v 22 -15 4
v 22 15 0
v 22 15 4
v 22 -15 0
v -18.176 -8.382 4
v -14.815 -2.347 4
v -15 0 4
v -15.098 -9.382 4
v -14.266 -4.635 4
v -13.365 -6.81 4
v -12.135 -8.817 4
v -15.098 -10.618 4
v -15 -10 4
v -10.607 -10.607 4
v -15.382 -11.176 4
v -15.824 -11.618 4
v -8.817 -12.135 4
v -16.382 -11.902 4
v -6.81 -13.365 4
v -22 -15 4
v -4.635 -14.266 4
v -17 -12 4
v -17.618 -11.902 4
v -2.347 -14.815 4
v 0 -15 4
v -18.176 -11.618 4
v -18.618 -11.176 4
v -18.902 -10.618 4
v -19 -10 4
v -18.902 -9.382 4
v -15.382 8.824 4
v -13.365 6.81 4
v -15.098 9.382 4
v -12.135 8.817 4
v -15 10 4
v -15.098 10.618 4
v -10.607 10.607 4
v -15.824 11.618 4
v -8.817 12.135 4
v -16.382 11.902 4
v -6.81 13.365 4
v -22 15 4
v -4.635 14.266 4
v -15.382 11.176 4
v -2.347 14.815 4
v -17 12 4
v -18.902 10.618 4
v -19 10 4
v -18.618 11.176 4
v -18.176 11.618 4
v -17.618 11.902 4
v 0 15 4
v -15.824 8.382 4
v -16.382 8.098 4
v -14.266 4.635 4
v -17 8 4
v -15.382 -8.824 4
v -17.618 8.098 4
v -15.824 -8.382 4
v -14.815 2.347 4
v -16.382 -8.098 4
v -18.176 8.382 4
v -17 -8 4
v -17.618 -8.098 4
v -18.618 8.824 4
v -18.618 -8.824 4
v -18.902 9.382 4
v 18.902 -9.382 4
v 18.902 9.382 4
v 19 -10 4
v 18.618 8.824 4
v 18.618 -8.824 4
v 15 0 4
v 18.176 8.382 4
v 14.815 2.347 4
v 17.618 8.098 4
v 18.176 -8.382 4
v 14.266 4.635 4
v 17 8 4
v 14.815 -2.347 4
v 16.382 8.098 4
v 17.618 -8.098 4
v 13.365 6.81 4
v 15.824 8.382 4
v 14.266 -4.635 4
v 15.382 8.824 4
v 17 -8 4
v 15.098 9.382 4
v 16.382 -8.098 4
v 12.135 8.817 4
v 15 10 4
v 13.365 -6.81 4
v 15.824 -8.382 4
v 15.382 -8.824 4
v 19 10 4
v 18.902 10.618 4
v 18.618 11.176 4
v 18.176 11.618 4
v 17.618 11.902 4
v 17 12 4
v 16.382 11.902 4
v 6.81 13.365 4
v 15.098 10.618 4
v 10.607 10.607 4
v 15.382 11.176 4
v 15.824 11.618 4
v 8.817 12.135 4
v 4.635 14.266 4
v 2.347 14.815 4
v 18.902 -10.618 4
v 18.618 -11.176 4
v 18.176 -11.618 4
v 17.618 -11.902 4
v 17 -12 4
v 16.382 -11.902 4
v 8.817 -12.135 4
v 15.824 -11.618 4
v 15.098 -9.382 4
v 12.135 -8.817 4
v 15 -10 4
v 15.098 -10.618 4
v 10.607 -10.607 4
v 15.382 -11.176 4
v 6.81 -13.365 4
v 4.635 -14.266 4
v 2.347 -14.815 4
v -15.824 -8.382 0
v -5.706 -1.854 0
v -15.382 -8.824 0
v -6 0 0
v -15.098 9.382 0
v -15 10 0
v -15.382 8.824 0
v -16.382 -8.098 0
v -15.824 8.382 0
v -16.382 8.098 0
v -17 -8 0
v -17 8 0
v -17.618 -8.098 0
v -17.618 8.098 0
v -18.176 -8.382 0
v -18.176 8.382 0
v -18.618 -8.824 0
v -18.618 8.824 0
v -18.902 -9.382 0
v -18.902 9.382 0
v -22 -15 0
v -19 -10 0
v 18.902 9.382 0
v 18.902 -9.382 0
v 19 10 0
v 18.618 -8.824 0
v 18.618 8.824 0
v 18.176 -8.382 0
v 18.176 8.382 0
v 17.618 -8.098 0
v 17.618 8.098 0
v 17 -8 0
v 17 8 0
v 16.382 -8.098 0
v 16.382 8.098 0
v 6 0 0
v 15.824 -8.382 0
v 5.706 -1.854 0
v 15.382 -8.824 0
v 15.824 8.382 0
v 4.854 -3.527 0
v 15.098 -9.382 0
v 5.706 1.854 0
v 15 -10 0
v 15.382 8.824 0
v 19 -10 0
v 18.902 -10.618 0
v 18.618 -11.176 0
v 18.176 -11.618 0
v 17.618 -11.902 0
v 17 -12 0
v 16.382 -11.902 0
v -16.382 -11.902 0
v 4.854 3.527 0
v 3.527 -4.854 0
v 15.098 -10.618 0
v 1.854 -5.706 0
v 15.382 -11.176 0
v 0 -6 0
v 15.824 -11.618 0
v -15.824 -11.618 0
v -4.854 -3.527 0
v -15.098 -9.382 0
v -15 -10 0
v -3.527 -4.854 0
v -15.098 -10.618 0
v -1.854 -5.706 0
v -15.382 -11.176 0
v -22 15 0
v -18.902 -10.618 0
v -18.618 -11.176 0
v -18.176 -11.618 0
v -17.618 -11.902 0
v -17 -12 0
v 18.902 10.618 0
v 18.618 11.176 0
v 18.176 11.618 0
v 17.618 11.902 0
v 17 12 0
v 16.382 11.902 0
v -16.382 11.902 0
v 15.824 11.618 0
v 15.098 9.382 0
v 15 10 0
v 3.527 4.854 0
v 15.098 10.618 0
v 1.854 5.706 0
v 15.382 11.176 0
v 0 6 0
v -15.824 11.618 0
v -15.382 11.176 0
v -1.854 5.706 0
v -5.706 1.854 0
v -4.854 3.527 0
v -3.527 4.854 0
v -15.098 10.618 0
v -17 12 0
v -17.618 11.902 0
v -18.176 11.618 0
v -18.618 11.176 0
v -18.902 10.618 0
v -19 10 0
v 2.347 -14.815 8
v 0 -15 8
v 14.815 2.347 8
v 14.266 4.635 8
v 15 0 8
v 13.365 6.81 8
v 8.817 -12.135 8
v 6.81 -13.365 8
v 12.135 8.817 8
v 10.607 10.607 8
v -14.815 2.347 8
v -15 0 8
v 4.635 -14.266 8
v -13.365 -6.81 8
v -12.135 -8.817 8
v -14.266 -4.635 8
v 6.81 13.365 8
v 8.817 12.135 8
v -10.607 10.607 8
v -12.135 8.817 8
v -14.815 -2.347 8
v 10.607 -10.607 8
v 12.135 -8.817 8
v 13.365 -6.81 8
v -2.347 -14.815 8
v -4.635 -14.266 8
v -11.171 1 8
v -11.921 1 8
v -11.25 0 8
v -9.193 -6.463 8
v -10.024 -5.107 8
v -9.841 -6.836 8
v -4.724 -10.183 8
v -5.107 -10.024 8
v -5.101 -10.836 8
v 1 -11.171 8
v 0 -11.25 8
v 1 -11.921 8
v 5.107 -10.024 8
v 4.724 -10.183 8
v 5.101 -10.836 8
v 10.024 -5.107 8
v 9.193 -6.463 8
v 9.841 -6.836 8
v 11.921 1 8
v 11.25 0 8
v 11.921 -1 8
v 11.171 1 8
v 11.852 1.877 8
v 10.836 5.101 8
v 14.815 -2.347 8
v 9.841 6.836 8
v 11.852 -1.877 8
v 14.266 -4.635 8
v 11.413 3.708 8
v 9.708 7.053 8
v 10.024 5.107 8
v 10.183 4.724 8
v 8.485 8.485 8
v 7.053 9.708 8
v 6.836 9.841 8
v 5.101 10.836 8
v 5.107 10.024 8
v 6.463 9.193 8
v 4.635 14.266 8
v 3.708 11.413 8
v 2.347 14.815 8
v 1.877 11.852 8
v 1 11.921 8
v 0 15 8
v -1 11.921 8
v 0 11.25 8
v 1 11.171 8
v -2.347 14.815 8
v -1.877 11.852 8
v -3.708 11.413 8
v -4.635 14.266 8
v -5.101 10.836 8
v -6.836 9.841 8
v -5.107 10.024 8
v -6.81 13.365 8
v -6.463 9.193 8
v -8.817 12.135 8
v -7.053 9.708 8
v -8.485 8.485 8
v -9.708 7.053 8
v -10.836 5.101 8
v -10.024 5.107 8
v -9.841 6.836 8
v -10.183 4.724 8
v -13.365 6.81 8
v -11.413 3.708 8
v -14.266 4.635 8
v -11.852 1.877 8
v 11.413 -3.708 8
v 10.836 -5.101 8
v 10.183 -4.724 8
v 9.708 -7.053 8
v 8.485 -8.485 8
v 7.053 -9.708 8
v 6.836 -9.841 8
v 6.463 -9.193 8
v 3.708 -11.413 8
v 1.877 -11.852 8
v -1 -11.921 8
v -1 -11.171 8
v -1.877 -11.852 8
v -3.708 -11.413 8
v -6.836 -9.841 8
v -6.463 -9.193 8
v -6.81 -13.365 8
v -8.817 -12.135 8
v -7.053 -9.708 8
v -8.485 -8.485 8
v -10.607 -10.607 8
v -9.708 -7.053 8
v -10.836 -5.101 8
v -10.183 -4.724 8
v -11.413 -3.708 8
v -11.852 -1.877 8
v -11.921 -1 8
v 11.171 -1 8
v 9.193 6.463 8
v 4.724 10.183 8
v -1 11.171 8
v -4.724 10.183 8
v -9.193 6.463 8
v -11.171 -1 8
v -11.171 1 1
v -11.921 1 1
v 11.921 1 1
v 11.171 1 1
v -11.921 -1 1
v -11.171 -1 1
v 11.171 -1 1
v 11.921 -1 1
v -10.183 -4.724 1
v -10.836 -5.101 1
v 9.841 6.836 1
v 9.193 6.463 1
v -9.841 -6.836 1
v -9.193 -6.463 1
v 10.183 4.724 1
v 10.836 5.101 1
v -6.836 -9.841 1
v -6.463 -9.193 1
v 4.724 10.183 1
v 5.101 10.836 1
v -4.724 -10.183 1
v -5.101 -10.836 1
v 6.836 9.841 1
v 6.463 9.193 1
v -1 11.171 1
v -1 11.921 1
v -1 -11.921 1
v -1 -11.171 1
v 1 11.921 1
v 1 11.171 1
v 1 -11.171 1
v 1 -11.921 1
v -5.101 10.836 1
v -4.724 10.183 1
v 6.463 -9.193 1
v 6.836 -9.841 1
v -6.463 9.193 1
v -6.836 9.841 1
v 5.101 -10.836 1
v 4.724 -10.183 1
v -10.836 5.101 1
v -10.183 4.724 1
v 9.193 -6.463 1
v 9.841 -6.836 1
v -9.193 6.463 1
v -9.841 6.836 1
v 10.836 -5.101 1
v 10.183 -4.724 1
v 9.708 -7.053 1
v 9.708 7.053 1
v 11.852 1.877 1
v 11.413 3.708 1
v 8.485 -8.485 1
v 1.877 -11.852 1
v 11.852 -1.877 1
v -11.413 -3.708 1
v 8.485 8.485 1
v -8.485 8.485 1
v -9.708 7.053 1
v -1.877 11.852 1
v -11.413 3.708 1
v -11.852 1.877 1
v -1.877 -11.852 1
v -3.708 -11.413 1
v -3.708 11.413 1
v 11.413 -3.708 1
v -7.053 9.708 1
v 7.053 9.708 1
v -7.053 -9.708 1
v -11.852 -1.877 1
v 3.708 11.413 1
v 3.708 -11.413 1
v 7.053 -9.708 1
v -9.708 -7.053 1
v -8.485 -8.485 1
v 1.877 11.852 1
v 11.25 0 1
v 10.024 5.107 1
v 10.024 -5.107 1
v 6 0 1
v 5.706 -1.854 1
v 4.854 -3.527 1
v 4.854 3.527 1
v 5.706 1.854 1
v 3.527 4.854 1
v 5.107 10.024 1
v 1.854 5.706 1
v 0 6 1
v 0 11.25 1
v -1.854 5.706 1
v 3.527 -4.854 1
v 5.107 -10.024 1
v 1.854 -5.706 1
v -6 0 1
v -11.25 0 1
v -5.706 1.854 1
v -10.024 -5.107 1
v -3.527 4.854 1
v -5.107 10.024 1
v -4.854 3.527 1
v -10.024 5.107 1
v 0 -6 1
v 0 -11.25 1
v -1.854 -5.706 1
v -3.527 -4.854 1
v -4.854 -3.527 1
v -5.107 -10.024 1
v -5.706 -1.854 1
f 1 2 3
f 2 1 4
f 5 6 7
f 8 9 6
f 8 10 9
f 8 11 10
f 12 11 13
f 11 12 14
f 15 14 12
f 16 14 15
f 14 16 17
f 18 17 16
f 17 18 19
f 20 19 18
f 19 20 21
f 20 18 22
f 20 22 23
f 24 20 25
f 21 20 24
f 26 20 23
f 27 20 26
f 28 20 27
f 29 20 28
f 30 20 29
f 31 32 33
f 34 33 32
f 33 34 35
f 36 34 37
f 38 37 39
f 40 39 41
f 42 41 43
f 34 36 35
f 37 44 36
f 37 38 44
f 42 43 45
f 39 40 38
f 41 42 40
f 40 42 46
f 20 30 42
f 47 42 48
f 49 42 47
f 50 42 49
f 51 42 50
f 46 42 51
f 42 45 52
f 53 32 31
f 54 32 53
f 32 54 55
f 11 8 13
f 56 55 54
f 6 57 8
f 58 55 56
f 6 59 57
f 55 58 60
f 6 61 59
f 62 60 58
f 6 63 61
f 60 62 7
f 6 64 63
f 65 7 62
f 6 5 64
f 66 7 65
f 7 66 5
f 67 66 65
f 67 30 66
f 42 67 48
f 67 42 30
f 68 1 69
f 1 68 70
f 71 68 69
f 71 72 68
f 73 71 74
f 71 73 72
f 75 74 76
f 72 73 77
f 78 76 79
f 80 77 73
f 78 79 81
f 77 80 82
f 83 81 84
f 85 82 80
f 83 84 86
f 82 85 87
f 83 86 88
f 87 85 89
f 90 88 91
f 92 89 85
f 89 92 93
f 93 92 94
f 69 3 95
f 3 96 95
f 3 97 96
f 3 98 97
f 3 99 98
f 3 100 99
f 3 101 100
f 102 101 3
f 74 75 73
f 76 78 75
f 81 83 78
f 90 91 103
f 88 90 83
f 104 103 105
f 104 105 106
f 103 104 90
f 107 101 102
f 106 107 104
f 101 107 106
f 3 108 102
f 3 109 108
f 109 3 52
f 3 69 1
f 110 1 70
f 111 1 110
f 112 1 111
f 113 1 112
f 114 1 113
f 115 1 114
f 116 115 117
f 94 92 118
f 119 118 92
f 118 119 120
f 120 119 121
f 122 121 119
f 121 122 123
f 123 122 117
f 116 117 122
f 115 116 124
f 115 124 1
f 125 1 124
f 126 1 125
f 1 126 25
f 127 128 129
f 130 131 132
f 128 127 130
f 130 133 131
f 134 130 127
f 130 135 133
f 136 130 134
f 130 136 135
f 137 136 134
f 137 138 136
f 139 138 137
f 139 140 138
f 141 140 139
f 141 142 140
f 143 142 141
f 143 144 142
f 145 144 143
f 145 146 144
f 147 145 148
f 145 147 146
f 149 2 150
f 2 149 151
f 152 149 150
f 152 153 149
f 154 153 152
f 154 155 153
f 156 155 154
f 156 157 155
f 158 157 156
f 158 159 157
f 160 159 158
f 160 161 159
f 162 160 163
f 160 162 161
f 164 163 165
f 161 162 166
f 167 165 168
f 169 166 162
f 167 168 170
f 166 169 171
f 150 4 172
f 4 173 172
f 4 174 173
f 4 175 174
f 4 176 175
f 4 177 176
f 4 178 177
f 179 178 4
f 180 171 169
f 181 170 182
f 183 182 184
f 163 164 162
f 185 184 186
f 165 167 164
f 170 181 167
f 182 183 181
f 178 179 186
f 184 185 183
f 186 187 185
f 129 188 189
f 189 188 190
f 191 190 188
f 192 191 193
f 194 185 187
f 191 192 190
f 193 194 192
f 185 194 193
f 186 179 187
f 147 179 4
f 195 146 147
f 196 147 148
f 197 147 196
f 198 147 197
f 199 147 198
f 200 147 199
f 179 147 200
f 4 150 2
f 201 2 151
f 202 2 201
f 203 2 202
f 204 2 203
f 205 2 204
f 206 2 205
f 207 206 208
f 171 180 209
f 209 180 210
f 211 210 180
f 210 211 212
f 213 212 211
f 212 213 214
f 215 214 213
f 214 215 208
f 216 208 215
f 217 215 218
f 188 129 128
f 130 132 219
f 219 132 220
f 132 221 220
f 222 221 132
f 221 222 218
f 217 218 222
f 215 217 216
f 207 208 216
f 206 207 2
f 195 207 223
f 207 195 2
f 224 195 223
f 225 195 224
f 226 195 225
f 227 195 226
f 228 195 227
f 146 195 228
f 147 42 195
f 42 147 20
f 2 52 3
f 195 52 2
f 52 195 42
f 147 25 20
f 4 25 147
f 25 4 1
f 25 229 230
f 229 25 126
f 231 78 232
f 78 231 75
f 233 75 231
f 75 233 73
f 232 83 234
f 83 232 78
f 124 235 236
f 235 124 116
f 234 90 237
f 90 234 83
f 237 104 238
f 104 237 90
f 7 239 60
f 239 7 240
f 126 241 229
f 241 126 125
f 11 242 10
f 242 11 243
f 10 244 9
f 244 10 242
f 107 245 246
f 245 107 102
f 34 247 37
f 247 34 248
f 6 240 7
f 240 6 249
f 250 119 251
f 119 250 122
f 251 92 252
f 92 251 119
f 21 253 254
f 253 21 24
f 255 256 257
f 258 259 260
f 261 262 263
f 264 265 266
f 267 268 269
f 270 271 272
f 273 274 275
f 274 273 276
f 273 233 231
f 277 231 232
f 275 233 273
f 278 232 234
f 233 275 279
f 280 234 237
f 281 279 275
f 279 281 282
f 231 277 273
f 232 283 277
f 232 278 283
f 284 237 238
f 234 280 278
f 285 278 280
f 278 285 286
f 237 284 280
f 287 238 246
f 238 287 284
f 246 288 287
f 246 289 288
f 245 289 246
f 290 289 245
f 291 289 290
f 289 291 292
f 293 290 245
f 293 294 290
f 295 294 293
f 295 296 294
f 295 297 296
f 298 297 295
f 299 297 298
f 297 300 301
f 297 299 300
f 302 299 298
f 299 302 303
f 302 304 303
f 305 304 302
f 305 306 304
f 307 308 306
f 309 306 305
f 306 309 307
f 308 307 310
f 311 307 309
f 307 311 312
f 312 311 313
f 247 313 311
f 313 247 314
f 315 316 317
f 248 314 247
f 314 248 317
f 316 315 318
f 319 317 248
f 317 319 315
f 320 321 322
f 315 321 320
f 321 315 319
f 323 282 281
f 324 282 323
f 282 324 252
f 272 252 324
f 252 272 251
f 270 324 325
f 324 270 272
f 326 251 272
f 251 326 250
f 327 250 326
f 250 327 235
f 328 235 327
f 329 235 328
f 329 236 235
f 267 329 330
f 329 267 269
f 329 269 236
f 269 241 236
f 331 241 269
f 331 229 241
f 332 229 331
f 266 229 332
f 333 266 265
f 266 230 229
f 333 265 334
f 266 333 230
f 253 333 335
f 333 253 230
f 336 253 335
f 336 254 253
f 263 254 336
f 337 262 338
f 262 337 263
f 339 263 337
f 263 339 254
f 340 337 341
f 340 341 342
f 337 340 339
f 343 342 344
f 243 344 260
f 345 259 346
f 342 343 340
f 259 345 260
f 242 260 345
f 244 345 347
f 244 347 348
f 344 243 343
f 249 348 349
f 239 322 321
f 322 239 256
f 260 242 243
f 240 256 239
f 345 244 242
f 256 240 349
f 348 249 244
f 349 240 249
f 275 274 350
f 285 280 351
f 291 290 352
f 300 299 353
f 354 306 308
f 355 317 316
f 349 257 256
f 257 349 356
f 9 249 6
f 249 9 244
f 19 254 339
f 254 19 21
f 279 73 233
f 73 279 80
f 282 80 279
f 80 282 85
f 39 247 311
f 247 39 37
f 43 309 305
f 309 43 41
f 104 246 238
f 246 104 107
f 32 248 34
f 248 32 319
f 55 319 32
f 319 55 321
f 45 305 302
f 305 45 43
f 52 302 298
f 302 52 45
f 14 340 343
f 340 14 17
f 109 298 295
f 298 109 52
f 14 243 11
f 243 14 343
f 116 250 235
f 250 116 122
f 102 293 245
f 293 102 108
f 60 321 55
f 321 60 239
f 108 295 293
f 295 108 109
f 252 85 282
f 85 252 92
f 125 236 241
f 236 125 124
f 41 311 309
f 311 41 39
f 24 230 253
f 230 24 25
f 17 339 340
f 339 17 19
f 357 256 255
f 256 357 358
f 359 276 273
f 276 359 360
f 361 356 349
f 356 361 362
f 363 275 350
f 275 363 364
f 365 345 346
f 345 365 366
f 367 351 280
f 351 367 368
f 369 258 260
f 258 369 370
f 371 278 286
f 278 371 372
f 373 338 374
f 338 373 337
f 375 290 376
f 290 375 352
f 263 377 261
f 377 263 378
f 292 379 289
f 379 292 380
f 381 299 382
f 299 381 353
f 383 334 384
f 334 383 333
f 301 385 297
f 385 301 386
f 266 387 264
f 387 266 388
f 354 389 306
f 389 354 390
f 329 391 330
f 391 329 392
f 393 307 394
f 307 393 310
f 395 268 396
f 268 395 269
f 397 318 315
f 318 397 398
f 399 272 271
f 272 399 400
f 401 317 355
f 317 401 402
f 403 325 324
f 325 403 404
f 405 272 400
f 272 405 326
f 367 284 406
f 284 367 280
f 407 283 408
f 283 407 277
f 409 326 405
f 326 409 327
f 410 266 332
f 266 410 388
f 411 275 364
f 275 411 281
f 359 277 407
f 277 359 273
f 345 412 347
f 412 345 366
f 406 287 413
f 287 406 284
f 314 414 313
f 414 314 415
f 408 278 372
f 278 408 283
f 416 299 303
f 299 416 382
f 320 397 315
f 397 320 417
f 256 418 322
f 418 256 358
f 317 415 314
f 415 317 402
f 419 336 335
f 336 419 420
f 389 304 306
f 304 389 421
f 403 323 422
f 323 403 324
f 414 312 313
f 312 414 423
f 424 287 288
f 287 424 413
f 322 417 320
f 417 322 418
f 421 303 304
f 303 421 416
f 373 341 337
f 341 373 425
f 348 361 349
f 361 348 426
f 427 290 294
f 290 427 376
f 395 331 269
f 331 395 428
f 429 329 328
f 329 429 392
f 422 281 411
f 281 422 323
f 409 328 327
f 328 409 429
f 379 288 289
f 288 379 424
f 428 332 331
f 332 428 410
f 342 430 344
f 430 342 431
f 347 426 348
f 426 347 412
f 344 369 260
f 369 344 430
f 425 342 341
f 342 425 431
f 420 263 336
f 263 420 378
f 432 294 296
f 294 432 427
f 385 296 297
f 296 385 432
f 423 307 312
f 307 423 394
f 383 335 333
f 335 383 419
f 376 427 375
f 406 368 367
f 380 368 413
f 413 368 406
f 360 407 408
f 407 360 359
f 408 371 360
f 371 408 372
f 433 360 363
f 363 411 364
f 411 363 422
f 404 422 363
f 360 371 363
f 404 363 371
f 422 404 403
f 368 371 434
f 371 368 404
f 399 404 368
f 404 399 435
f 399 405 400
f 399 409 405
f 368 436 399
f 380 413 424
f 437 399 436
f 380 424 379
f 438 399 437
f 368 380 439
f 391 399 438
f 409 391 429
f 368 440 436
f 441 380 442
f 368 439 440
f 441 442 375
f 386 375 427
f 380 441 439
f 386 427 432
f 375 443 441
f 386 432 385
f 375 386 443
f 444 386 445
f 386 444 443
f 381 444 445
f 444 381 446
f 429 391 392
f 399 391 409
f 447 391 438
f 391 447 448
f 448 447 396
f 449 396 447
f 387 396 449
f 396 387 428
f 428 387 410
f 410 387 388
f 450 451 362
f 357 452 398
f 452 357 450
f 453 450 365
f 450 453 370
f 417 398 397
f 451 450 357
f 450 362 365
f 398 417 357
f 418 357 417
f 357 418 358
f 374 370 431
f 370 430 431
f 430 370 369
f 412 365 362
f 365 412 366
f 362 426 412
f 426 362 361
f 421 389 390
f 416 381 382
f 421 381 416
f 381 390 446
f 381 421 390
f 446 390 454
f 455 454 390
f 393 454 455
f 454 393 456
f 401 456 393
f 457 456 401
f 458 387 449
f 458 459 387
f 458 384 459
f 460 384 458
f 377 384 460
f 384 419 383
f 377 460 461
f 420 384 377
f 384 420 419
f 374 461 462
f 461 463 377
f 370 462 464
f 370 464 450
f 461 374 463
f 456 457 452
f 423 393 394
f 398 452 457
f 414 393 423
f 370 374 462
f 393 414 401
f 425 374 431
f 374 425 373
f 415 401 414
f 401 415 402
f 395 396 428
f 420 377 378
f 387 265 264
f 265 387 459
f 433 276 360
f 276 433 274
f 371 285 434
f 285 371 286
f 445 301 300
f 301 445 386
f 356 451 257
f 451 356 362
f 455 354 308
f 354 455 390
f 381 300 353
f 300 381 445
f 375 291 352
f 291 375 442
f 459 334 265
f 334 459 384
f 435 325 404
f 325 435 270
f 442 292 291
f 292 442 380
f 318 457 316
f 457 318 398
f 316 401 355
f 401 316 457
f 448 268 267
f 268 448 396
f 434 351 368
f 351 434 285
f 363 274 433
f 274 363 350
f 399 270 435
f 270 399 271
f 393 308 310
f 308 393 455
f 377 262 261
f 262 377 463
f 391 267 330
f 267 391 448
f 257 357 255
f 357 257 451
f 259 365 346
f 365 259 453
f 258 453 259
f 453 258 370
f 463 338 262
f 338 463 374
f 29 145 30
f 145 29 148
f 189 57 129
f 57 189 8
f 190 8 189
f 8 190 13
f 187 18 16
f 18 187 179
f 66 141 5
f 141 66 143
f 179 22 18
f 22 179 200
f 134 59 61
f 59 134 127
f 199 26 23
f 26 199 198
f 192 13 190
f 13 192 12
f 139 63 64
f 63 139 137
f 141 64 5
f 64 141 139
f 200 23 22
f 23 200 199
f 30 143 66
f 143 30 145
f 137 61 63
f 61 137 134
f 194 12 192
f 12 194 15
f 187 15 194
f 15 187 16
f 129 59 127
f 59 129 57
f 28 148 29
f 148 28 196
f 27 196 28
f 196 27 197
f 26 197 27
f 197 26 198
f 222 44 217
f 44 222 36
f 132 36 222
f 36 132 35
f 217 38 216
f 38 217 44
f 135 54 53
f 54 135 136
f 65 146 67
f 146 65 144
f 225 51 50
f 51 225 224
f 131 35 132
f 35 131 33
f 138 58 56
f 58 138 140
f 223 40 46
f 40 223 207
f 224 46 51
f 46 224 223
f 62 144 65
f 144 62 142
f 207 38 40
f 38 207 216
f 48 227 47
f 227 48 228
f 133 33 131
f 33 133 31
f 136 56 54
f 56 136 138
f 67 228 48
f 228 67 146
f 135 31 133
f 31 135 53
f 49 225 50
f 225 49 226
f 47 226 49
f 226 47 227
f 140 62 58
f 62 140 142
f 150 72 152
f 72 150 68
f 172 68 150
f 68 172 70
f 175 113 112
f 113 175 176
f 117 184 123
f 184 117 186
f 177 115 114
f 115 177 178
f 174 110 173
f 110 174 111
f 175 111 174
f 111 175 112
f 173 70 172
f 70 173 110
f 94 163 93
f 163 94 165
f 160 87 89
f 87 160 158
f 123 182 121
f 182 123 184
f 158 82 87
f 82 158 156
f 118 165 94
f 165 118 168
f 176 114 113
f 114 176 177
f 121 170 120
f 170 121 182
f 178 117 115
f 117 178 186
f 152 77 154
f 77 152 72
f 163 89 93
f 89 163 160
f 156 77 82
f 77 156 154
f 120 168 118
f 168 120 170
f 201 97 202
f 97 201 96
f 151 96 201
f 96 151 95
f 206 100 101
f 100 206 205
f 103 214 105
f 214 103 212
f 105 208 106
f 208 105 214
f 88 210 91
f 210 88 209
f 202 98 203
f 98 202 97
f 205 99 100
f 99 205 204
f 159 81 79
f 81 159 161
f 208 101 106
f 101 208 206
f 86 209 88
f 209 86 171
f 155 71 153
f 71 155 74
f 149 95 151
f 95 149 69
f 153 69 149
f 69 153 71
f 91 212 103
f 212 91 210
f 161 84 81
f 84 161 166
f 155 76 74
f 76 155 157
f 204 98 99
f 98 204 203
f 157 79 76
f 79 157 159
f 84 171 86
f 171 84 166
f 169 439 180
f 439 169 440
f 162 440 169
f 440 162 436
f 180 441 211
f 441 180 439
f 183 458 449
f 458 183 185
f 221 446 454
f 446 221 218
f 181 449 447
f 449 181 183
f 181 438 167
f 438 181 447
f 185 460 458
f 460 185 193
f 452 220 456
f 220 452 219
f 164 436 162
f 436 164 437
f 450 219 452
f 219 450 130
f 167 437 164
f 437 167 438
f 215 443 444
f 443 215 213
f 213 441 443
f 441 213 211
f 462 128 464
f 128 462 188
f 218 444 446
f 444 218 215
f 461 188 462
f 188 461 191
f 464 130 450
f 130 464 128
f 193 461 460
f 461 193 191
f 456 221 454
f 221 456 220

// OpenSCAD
diry=4;
vrstva = 0.4;


module  lozisko_dira(){
    cylinder(d=22.5,h=7.5,$fn=40);  
    difference(){
        cylinder(d=24,h=7.5,$fn=40);
        for(a=[0:30:180]){
            rotate([0,0,a])
                cube([40,2,20],center=true);
        }
    }
}

module paka_lozisko(){
    difference(){
        union(){
            translate([-22,-15,0])
              cube([44,30,4]);
            cylinder(d=30,h=8,$fn=40);
        }
        translate([0,0,1])
            lozisko_dira();
        cylinder(d=12,h=10,$fn=20);
        for(a=[-17:34:17]){
            for(b=[-10:20:10]){
                translate([a,b,0])
                    cylinder(d=diry,h=10,$fn=20);
            }
        }        
    }

}

paka_lozisko();
